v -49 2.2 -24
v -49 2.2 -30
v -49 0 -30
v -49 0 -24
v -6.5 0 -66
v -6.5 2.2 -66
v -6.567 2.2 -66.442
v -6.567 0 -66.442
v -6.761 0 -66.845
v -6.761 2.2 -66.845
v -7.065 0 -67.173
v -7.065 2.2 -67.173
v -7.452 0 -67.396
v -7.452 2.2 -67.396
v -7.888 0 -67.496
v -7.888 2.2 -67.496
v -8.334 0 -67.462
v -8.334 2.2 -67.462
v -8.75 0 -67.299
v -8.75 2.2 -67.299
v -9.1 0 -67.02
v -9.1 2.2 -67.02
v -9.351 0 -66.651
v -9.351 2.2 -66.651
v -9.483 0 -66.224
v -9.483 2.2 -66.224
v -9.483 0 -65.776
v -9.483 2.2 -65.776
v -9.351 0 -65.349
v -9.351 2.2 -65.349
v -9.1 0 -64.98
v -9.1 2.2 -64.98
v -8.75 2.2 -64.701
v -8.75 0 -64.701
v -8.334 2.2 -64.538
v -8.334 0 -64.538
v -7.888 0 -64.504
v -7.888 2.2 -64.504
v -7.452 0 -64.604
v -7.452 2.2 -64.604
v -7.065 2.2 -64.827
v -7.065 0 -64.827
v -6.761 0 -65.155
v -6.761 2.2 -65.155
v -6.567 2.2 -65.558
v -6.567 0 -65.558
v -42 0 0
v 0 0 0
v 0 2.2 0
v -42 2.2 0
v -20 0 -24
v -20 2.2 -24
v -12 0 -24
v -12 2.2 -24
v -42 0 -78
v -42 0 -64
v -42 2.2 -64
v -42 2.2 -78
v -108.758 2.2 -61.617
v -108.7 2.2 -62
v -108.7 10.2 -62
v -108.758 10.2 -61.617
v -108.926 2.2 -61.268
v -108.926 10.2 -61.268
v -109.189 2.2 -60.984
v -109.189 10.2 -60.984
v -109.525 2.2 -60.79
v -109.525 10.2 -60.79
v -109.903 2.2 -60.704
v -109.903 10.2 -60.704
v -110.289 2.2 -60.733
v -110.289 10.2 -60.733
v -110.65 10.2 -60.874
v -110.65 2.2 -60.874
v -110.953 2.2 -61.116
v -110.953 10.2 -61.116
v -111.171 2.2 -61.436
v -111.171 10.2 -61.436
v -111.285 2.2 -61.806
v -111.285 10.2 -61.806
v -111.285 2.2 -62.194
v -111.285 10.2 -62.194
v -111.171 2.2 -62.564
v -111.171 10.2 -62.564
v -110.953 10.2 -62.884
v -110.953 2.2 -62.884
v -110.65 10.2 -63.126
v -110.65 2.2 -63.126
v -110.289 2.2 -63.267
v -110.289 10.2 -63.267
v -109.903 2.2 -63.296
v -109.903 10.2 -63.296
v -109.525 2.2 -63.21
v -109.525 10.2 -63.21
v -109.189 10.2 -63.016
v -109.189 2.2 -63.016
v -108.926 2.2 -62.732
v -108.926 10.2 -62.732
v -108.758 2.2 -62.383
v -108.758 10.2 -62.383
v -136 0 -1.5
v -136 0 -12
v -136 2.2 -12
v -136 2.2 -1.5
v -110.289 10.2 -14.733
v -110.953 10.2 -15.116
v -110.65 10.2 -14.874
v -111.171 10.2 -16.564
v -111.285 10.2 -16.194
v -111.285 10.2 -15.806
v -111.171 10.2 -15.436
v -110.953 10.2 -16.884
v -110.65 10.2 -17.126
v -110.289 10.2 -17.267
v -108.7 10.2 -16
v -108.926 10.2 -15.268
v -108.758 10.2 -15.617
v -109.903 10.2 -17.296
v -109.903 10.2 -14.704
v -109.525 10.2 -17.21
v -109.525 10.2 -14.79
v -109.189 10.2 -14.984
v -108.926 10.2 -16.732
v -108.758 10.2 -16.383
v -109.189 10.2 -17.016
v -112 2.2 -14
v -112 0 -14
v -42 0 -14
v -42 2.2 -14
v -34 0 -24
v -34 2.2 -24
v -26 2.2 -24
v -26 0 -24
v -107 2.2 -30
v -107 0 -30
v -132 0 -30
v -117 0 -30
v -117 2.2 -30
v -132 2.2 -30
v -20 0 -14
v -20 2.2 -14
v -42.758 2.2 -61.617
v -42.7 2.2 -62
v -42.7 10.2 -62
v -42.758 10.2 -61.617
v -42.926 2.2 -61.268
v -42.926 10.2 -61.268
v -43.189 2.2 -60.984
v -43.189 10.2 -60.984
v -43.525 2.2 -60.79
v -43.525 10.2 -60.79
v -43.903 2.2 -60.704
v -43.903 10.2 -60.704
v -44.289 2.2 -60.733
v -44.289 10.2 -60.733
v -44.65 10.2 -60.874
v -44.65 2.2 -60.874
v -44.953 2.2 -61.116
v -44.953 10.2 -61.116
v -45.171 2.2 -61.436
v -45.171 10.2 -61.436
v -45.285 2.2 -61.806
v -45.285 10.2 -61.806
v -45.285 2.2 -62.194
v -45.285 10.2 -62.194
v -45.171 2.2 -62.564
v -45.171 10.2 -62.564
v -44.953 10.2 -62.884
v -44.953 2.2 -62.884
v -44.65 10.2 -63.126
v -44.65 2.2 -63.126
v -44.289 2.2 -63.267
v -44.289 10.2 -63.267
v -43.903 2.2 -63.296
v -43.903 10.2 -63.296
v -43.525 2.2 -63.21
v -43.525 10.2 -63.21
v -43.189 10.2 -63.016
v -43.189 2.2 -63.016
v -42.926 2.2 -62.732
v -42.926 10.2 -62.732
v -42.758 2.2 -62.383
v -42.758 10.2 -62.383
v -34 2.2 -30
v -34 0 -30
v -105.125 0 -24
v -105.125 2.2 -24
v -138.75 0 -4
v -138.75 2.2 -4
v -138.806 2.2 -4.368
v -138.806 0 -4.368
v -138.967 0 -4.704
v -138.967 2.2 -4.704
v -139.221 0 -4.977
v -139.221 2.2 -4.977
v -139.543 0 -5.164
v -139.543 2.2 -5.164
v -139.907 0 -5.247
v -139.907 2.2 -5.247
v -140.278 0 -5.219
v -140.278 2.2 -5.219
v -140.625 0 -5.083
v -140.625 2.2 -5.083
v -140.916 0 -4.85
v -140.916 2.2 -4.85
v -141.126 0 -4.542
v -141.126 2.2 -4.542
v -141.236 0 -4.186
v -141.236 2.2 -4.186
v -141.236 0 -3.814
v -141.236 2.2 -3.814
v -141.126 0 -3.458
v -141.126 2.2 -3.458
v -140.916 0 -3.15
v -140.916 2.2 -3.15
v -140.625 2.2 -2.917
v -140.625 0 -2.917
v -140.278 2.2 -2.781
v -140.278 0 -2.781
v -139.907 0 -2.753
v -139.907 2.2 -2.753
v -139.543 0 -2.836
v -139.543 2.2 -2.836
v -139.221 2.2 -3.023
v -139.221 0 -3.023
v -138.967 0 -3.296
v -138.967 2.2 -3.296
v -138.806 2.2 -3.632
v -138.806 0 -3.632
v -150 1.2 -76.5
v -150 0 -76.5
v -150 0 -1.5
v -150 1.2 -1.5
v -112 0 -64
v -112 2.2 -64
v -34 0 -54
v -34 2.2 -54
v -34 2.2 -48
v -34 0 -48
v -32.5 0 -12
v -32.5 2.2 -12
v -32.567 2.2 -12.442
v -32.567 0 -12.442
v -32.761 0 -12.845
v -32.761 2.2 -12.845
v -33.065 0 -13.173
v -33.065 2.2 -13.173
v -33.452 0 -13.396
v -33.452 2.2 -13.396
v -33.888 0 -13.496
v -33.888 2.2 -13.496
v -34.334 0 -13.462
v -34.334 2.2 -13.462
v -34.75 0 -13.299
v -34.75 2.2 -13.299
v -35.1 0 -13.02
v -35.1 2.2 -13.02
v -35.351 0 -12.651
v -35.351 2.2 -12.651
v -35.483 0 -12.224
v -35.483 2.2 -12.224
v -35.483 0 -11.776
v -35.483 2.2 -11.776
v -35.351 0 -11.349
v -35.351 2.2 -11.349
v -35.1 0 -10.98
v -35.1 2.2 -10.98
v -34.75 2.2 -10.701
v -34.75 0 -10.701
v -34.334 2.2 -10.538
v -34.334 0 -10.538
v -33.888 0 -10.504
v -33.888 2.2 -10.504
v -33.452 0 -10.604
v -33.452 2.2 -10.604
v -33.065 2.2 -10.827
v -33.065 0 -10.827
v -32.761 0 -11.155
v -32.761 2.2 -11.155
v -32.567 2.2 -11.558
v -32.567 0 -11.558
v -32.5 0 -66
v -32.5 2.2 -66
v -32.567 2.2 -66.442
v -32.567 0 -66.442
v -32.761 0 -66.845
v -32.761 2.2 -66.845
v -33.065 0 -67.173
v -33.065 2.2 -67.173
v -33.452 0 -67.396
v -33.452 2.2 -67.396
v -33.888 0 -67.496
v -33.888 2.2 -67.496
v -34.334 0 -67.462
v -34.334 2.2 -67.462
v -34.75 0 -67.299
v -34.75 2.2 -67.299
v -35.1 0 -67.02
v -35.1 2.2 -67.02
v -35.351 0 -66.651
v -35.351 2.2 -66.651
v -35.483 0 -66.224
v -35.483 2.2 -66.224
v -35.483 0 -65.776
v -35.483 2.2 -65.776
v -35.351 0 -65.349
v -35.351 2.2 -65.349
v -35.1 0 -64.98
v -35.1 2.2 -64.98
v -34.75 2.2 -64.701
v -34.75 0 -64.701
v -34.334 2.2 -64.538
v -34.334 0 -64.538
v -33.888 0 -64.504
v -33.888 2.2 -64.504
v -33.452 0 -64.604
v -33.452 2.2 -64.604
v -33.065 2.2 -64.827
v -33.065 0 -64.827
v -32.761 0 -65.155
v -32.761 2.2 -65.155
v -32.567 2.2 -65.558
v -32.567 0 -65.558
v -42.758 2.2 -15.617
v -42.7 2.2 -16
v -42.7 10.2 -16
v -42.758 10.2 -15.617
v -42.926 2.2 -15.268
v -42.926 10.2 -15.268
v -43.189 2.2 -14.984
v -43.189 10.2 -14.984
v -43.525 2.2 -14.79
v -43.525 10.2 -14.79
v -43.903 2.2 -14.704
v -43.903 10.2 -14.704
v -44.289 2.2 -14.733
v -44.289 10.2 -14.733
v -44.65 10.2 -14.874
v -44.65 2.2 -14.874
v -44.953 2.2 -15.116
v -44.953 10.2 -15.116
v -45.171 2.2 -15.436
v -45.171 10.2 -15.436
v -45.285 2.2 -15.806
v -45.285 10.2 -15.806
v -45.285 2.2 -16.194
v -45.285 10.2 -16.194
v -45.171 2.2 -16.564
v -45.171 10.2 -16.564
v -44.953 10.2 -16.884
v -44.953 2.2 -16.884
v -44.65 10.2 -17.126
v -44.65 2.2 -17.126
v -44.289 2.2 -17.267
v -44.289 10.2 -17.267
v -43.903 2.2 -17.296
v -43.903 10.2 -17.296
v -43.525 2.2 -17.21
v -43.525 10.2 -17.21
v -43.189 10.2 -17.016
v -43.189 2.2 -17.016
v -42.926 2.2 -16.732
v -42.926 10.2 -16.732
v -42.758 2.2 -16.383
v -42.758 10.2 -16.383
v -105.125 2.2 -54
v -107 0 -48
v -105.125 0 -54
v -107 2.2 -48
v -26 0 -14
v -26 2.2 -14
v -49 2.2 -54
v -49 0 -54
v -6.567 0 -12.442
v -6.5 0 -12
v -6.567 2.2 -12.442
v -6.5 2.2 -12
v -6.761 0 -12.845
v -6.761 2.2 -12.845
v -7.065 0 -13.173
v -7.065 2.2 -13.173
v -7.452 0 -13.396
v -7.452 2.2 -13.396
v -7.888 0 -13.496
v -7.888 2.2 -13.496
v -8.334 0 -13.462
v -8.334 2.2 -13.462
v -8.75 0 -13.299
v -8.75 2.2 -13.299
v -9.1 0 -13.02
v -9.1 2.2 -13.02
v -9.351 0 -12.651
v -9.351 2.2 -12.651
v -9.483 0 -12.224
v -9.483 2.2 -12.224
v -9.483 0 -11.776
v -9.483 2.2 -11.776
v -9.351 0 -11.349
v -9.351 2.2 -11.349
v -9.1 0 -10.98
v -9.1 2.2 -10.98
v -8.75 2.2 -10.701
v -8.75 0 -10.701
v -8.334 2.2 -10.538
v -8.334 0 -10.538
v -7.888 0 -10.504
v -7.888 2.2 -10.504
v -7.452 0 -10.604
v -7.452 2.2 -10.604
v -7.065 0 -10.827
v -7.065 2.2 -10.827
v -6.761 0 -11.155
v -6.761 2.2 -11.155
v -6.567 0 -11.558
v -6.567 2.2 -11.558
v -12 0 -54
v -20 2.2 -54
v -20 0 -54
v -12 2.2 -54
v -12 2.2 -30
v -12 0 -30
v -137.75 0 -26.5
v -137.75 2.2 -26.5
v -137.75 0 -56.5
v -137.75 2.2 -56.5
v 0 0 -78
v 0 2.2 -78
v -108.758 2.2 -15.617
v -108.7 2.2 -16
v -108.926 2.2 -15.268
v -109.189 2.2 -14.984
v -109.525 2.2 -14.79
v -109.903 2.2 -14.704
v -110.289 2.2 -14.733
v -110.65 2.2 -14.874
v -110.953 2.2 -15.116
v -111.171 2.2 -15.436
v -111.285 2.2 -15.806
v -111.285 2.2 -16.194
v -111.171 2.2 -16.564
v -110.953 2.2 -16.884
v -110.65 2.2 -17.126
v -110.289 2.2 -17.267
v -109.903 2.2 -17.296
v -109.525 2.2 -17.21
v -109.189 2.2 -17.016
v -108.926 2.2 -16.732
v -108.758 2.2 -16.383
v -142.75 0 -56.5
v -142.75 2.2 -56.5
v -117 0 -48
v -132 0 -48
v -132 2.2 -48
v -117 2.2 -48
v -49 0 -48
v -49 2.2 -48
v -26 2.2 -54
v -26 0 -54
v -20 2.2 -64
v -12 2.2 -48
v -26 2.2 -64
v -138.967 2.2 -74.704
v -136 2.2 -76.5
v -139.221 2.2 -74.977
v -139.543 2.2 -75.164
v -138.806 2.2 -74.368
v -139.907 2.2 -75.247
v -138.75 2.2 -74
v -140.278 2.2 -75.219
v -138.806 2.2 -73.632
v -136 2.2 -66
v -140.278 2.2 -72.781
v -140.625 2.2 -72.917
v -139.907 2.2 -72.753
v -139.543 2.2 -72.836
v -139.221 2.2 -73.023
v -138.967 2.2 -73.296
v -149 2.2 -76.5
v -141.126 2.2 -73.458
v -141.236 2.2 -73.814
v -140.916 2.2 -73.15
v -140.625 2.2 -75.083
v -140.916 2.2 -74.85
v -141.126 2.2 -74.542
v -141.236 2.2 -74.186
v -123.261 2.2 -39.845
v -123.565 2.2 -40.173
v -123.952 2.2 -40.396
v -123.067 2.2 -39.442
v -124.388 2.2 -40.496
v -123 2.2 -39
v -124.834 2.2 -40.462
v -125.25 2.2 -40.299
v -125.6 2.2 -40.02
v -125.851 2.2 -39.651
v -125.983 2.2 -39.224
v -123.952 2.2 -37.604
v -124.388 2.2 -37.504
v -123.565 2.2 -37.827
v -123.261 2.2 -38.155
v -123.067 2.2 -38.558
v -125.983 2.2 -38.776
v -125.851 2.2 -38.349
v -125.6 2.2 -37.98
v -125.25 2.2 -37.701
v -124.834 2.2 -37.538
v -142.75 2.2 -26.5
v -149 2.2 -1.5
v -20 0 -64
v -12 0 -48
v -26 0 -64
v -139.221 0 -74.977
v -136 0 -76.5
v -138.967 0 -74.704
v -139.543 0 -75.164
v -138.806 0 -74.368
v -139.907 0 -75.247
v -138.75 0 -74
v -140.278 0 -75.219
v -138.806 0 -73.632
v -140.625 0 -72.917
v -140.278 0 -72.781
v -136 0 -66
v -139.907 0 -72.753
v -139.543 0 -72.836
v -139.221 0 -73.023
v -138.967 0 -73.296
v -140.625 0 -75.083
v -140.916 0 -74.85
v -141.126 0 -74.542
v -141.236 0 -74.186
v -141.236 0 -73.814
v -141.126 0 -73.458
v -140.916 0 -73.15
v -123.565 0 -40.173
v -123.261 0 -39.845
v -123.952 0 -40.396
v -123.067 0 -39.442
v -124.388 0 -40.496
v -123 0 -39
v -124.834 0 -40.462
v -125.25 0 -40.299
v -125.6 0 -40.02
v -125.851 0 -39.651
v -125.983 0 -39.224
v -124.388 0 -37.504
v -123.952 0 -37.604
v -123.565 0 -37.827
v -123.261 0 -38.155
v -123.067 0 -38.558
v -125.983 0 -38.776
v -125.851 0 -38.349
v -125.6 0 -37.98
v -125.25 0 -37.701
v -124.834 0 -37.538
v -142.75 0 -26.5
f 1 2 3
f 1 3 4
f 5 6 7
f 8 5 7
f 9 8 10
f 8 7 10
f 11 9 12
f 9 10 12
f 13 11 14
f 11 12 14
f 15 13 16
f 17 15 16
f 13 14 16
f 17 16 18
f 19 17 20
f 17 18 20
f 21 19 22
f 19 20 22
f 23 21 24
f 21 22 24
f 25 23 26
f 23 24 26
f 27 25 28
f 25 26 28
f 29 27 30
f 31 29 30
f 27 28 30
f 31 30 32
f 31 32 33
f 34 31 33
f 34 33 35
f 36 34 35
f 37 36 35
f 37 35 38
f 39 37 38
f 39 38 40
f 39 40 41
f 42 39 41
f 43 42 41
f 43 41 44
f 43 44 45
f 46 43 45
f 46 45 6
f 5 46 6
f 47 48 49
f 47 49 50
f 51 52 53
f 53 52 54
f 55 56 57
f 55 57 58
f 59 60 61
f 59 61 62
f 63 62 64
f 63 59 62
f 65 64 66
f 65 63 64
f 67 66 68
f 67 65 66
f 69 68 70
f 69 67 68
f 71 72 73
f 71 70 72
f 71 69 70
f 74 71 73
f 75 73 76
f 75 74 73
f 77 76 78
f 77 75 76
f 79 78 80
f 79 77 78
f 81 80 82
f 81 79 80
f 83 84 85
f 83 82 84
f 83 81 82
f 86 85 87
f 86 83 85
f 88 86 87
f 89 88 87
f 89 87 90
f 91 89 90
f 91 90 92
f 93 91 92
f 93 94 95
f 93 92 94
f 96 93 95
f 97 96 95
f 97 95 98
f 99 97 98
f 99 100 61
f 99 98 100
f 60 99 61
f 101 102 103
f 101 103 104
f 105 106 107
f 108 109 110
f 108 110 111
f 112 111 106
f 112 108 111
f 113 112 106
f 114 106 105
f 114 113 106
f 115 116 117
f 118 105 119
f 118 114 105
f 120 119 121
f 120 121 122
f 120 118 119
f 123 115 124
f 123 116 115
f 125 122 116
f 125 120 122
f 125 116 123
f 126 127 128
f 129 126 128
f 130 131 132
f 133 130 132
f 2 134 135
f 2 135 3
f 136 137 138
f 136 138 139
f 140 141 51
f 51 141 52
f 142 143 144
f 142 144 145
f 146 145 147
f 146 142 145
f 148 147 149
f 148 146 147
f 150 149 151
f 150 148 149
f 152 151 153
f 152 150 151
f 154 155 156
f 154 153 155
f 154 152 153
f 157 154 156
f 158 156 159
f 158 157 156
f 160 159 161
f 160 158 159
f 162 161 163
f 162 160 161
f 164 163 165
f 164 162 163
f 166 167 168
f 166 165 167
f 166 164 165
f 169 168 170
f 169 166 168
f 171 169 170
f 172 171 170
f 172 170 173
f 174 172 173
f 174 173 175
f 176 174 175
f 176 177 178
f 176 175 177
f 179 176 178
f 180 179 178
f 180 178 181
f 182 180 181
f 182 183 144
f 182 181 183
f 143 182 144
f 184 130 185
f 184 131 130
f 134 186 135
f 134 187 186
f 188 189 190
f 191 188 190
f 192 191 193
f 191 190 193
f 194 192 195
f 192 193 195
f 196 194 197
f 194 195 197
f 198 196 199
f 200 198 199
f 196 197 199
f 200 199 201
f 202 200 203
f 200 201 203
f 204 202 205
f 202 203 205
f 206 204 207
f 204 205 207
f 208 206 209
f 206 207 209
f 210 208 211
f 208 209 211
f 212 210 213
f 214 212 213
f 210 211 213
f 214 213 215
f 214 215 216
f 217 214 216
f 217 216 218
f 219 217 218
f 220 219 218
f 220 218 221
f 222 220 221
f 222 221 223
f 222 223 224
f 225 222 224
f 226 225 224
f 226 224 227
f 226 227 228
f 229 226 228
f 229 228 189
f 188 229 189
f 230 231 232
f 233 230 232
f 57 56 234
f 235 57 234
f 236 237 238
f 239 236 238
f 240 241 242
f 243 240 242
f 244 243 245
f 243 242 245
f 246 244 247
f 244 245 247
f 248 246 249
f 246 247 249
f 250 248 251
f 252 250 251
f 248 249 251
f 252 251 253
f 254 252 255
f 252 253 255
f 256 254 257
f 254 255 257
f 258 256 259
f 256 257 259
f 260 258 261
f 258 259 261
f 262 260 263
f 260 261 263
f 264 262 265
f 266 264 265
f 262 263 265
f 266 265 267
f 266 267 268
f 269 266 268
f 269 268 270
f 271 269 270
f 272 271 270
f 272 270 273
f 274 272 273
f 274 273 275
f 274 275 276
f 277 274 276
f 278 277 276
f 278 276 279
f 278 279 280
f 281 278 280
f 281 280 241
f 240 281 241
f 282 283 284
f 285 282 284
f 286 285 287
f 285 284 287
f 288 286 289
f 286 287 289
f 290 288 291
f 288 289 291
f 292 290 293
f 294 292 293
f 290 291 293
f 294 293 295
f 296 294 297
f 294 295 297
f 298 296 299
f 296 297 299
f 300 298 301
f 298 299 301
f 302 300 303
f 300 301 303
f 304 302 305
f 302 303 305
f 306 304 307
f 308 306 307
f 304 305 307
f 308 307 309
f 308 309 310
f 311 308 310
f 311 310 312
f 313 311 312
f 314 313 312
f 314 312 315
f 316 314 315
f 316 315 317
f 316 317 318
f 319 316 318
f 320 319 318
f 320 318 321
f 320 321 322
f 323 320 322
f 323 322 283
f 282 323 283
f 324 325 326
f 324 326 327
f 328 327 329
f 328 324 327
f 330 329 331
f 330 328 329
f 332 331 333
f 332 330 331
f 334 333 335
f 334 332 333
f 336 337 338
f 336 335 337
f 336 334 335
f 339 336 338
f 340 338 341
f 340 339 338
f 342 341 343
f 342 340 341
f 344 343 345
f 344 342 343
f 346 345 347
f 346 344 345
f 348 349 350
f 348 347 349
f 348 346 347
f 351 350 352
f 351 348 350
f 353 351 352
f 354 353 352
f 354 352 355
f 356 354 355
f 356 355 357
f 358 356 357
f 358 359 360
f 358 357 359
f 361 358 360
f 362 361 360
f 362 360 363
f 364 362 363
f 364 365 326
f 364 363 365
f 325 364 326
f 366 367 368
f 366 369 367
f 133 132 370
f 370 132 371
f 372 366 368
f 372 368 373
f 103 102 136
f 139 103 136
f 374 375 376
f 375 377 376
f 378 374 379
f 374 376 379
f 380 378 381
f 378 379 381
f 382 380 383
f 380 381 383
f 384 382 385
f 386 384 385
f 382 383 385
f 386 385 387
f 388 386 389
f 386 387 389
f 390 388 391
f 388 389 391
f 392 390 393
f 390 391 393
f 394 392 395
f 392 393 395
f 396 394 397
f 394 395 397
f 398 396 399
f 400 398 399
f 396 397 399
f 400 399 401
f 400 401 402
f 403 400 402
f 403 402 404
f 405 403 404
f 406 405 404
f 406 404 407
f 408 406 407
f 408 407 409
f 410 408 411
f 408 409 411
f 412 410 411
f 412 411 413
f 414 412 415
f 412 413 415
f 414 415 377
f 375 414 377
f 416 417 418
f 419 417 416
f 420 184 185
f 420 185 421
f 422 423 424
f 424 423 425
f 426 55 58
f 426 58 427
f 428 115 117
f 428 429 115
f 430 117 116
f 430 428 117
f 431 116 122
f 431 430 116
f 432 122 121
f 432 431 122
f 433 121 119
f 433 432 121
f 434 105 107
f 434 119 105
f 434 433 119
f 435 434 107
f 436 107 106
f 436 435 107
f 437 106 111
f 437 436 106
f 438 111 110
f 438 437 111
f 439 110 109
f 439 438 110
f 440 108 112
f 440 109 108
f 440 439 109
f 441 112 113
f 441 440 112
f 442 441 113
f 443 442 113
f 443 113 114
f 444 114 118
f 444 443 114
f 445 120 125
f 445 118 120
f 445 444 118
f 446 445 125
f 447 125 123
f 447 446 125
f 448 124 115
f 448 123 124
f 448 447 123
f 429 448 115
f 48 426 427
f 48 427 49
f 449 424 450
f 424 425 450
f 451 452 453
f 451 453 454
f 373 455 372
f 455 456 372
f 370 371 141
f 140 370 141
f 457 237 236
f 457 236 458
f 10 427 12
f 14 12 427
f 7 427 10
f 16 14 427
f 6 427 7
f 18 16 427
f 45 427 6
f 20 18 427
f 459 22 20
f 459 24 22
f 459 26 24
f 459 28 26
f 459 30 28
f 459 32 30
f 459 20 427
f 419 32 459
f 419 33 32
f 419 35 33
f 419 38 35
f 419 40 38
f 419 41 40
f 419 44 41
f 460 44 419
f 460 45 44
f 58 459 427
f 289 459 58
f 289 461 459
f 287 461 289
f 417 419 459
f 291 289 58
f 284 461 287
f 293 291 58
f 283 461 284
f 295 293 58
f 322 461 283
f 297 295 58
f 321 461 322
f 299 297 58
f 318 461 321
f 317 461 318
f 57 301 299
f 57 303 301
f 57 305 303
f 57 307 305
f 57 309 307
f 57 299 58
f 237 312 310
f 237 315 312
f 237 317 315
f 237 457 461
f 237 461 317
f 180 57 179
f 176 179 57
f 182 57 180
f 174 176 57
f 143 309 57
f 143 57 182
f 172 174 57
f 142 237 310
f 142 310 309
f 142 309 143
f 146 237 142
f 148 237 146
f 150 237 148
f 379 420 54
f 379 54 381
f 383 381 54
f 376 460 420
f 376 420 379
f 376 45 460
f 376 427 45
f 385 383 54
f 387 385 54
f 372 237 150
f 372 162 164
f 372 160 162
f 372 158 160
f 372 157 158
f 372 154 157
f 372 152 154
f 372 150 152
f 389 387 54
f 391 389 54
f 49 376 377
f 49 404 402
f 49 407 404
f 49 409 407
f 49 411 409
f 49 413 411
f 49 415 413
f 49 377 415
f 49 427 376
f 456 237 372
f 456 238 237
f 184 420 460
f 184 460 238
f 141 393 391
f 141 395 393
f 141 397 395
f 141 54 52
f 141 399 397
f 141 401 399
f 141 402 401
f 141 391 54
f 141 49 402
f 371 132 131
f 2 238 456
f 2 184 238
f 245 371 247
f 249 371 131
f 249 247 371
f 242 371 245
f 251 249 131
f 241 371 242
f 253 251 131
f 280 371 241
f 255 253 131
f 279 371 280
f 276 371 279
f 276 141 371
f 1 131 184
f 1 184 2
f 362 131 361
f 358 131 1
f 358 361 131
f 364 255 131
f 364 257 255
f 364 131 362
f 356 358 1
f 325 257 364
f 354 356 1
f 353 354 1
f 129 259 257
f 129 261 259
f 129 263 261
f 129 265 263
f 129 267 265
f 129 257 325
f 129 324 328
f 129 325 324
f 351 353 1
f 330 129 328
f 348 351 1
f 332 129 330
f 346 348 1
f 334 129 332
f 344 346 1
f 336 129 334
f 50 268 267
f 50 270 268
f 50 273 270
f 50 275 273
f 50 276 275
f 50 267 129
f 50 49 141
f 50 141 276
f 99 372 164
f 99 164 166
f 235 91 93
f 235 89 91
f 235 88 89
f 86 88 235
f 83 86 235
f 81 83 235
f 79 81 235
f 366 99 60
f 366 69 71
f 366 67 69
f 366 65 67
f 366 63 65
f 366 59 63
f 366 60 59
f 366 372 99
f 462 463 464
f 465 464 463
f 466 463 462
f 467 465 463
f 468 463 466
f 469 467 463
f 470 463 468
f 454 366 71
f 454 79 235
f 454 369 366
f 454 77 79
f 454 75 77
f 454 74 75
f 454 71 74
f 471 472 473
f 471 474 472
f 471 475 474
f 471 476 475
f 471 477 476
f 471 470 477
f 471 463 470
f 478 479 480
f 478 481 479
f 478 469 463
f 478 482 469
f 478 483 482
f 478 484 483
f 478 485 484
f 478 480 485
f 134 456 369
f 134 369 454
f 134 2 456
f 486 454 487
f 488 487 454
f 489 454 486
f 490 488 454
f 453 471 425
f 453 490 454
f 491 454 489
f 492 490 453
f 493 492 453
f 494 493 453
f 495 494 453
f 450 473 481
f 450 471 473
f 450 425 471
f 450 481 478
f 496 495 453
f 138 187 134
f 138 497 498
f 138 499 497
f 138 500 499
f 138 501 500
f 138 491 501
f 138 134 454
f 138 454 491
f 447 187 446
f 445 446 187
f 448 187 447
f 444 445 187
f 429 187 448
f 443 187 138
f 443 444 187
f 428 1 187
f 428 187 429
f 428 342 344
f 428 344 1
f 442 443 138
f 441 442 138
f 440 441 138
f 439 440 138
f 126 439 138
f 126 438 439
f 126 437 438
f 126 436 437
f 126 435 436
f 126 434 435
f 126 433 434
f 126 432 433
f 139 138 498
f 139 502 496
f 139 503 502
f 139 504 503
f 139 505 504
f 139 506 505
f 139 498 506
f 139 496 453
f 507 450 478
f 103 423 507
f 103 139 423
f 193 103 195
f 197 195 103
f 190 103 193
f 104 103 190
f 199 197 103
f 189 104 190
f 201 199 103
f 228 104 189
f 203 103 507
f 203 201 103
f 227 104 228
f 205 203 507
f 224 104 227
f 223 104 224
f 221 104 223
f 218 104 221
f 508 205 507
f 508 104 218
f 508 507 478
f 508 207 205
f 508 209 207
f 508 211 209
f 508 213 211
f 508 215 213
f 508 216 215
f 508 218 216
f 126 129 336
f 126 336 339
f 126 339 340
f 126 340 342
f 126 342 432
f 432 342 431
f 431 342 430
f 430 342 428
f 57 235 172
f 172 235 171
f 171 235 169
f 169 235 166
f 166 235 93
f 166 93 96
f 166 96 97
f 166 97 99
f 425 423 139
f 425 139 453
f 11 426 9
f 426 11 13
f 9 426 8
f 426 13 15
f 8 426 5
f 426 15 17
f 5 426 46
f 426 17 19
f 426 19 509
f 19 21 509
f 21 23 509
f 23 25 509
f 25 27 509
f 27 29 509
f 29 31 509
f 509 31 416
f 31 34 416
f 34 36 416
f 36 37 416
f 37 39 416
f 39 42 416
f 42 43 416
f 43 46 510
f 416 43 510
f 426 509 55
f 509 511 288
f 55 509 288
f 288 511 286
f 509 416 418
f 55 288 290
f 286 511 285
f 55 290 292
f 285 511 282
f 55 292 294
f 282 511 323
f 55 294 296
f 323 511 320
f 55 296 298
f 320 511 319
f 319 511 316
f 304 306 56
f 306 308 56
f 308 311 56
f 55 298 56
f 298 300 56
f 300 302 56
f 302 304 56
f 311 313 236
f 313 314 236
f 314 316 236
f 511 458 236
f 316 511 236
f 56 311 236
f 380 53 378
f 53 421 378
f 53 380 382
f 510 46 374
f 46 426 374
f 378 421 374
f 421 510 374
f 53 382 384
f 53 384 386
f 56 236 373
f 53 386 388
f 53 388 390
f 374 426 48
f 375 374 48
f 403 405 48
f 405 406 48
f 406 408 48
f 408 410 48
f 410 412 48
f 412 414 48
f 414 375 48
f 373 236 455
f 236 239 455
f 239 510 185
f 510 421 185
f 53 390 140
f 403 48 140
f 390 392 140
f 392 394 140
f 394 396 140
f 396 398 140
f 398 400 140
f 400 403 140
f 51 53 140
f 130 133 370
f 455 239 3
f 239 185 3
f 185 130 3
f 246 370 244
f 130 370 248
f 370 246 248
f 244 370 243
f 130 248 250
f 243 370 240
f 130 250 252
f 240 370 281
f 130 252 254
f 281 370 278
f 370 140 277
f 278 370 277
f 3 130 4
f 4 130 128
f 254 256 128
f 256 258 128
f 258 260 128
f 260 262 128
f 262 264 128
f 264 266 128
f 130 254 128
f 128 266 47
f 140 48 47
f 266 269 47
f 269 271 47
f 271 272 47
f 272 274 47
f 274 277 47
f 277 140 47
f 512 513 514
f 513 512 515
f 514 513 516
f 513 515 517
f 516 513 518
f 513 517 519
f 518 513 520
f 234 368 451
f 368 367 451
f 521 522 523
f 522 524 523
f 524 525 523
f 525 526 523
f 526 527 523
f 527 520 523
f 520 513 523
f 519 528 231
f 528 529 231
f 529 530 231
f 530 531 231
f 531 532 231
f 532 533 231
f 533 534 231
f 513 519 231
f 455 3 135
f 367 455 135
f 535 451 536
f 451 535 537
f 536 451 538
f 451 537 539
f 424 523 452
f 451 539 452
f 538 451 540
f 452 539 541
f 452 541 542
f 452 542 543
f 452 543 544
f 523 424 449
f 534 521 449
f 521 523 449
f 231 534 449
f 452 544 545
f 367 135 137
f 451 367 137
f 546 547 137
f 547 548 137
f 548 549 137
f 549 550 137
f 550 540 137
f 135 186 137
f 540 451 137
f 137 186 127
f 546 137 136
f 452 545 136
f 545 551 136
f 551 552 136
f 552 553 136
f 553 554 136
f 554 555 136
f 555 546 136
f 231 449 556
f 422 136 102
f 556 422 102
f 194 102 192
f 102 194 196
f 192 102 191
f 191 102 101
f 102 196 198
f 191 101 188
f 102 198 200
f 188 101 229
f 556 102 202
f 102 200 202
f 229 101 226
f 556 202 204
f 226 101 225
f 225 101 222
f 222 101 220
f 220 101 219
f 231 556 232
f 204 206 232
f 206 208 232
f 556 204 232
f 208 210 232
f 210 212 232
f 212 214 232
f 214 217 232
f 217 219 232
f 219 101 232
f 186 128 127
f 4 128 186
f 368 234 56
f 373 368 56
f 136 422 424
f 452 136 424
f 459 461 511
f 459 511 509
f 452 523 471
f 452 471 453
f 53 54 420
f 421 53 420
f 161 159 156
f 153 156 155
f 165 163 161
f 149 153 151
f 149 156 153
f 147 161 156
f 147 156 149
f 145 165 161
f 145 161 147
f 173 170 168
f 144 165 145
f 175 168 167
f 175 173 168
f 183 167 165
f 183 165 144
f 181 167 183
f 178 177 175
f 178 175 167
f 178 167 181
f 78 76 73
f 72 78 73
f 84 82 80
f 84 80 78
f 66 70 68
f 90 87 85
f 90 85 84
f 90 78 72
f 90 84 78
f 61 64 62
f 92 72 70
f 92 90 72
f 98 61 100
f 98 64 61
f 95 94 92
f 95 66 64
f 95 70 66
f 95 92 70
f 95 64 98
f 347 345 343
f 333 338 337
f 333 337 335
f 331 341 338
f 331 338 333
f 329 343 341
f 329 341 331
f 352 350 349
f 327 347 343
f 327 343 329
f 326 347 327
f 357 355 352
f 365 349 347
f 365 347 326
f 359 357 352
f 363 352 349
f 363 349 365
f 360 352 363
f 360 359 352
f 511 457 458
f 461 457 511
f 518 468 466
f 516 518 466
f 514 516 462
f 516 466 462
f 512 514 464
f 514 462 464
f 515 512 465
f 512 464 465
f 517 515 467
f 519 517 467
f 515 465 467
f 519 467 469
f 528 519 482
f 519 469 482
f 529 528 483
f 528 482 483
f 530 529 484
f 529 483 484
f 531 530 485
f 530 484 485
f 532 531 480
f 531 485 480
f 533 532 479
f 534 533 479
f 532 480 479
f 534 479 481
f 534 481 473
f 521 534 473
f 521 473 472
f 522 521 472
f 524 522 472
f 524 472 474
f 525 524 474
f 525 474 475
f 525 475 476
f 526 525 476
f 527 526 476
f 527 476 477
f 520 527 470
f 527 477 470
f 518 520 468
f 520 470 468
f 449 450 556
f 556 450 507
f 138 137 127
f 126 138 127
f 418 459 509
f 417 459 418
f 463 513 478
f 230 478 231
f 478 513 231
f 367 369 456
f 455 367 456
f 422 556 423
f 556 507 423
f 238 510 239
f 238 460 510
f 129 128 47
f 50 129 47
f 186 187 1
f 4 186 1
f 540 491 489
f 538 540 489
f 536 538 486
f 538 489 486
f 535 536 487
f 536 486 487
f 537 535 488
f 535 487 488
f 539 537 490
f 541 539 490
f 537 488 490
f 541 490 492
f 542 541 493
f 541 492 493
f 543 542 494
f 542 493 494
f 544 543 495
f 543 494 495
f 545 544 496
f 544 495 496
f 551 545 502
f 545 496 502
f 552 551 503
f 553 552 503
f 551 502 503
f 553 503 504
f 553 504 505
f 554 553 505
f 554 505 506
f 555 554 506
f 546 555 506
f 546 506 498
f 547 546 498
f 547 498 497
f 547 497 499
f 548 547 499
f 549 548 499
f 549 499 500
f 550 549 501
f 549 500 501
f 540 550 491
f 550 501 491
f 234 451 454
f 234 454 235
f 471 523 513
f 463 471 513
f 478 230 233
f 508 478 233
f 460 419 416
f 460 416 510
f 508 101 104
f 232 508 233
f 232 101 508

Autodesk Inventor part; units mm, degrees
ref_plane "YZ Plane" through (0, 0, 0) normal (1, 0, 0) x (0, 1, 0)
ref_plane "XZ Plane" through (0, 0, 0) normal (0, 1, 0) x (-1, 0, 0)
ref_plane "XY Plane" through (0, 0, 0) normal (0, 0, 1) x (1, 0, 0)
sketch "Sketch1" plane through (0, 0, 0) normal (0, 1, 0) x (-1, 0, 0)
  line L0 (42, -64) -> (112, -64)
  line L1 (112, -64) -> (112, -14)
  line L2 (112, -14) -> (42, -14)
  line L3 (112, -39) -> (112, -30)
  line L4 (112, -39) -> (112, -48)
  line L5 (112, -30) -> (136, -30)
  line L6 (136, -30) -> (136, -48)
  line L7 (136, -48) -> (112, -48)
  line L8 (112, -30) -> (117, -30)
  line L9 (117, -30) -> (112, -14)
  line L10 (112, -48) -> (117, -48)
  line L11 (117, -48) -> (112, -64)
  line L12 (136, -30) -> (136, -1.5)
  line L13 (136, -1.5) -> (150, -1.5)
  line L14 (136, -48) -> (136, -76.5)
  line L15 (136, -76.5) -> (150, -76.5)
  line L16 (150, -76.5) -> (150, -1.5)
  line L17 (42, -14) -> (42, 0)
  line L18 (42, 0) -> (42, -78)
  line L19 (42, -78) -> (0, -78)
  line L20 (0, -78) -> (0, 0)
  line L21 (0, 0) -> (42, 0)
  line L22 (136, -30) -> (132, -30)
  line L23 (136, -30) -> (136, -12)
  line L24 (136, -12) -> (132, -30)
  line L25 (136, -48) -> (132, -48)
  line L26 (136, -48) -> (136, -66)
  line L27 (136, -66) -> (132, -48)
  dimension "d3" = 70
  dimension "d4" = 50
  dimension "d5" = 9
  dimension "d6" = 9
  dimension "d7" = 24
  dimension "d8" = 18
  dimension "d9" = 5
  dimension "d10" = 5
  dimension "d11" = 28.5
  dimension "d12" = 14
  dimension "d13" = 28.5
  dimension "d14" = 14
  dimension "d20" = 78
  dimension "d21" = 42
  dimension "d22" = 14
  dimension "d23" = 14
  dimension "d24" = 1.5
  dimension "d25" = 94
  dimension "d26" = 4
  dimension "d27" = 18
  dimension "d28" = 4
  dimension "d29" = 18
extrude "Extrusion1" add sketch "Sketch1" along normal blind 2.2
sketch "Sketch2" plane through (0, 2.2, 0) normal (0, 1, 0) x (1, 0, 0)
  circle A0 centre (-34, 12) radius 1.5
  circle A1 centre (-8, 12) radius 1.5
  line L0 (-42, 0) -> (0, 0) projected
  line L1 (0, 0) -> (0, 78) projected
  line L2 (-42, 14) -> (-42, 0) projected
  circle A2 centre (-34, 66) radius 1.5
  circle A3 centre (-8, 66) radius 1.5
  line L3 (-42, 78) -> (-42, 64) projected
  line L4 (0, 78) -> (-42, 78) projected
  circle A4 centre (-124.5, 39) radius 1.5
  line L5 (-132, 30) -> (-117, 30) projected
  circle A5 centre (-140, 4) radius 1.25
  line L6 (-136, 1.5) -> (-136, 12) projected
  line L7 (-150, 1.5) -> (-136, 1.5) projected
  circle A6 centre (-140, 74) radius 1.25
  line L8 (-136, 66) -> (-136, 76.5) projected
  line L9 (-136, 76.5) -> (-150, 76.5) projected
  line L10 (-142.75, 26.5) -> (-137.75, 26.5)
  line L11 (-137.75, 26.5) -> (-137.75, 56.5)
  line L12 (-137.75, 56.5) -> (-142.75, 56.5)
  line L13 (-142.75, 56.5) -> (-142.75, 26.5)
  line L14 (-150, 76.5) -> (-150, 1.5) projected
  dimension "d32" = 3
  dimension "d33" = 3
  dimension "d34" = 12
  dimension "d35" = 8
  dimension "d36" = 8
  dimension "d37" = 12
  dimension "d38" = 3
  dimension "d39" = 3
  dimension "d40" = 8
  dimension "d41" = 12
  dimension "d42" = 12
  dimension "d43" = 8
  dimension "d44" = 9
  dimension "d45" = 7.5
  dimension "d46" = 3
  dimension "d47" = 2.5
  dimension "d48" = 4
  dimension "d49" = 2.5
  dimension "d50" = 2.5
  dimension "d51" = 4
  dimension "d52" = 2.5
  dimension "d53" = 5
  dimension "d54" = 30
  dimension "d55" = 20
  dimension "d56" = 7.25
extrude "Extrusion2" cut sketch "Sketch2" against normal blind 2.2
sketch "Sketch3" plane through (0, 2.2, 0) normal (0, 1, 0) x (1, 0, 0)
  line L0 (-42, 14) -> (-42, 0) projected
  line L1 (-42, 64) -> (-112, 64) projected
  line L2 (-42, 14) -> (-112, 14)
  line L3 (-112, 14) -> (-112, 64)
  line L4 (-112, 64) -> (-42, 64)
  line L5 (-42, 64) -> (-42, 14)
  circle A0 centre (-110, 16) radius 1.3
  circle A1 centre (-110, 62) radius 1.3
  circle A2 centre (-44, 16) radius 1.3
  circle A3 centre (-44, 62) radius 1.3
  point P0 (0, 0)
  dimension "d59" = 2
  dimension "d60" = 2
  dimension "d61" = 2.6
  dimension "d62" = 2
  dimension "d63" = 2
  dimension "d64" = 2.6
  dimension "d65" = 2.6
  dimension "d66" = 2.6
  dimension "d67" = 2
  dimension "d68" = 2
  dimension "d69" = 2
  dimension "d70" = 2
extrude "Extrusion3" add sketch "Sketch3" along normal blind 8 contours A0 | A1 | A2 | A3
sketch "Sketch4" plane through (0, 2.2, 0) normal (0, 1, 0) x (1, 0, 0)
  line L0 (-132, 30) -> (-117, 30) projected
  line L1 (-117, 30) -> (-112, 14) projected
  line L2 (-105.125, 24) -> (-107, 30)
  line L3 (-117, 48) -> (-132, 48) projected
  line L4 (-112, 64) -> (-117, 48) projected
  line L5 (-112, 64) -> (-102, 64)
  line L6 (-42, 64) -> (-112, 64) projected
  line L7 (-107, 48) -> (-105.125, 54)
  line L8 (-112, 14) -> (-42, 14) projected
  line L9 (-107, 30) -> (-49, 30)
  line L10 (-49, 30) -> (-49, 24)
  line L11 (-105.125, 24) -> (-49, 24)
  line L12 (-107, 48) -> (-49, 48)
  line L13 (-49, 48) -> (-49, 54)
  line L14 (-105.125, 54) -> (-49, 54)
  point P0 (0, 0)
  dimension "d79" = 10
  dimension "d88" = 10
  dimension "d93" = 10
  dimension "d111" = 58
  dimension "d112" = 6
  dimension "d113" = 10
  dimension "d114" = 6
  dimension "d115" = 72.646
  dimension "d116" = 58
  dimension "d117" = 56.125
  dimension "d118" = 18
  dimension "d119" = 6
  dimension "d120" = 6
extrude "Extrusion4" cut sketch "Sketch4" against normal blind 8
sketch "Sketch6" plane through (0, 2.2, 0) normal (0, 1, 0) x (1, 0, 0)
  line L0 (-34, 24) -> (-26, 24)
  line L1 (-26, 24) -> (-26, 14)
  line L2 (-26, 14) -> (-20, 14)
  line L3 (-34, 24) -> (-34, 30)
  line L4 (-34, 30) -> (-20, 30)
  line L5 (-20, 14) -> (-20, 24)
  line L6 (-20, 24) -> (-12, 24)
  line L7 (-12, 24) -> (-12, 30)
  line L8 (-12, 30) -> (-20, 30)
  line L9 (0, 0) -> (0, 78) projected
  line L10 (0, 39) -> (-41.084, 39)
  line L11 (-34, 54) -> (-26, 54)
  line L12 (-26, 54) -> (-26, 64)
  line L13 (-26, 64) -> (-20, 64)
  line L14 (-34, 54) -> (-34, 48)
  line L15 (-34, 48) -> (-20, 48)
  line L16 (-20, 64) -> (-20, 54)
  line L17 (-20, 54) -> (-12, 54)
  line L18 (-12, 54) -> (-12, 48)
  line L19 (-12, 48) -> (-20, 48)
  line L20 (-49, 30) -> (-49, 24) projected
  dimension "d97" = 8
  dimension "d98" = 10
  dimension "d99" = 6
  dimension "d100" = 16
  dimension "d101" = 6
  dimension "d102" = 10
  dimension "d103" = 8
  dimension "d104" = 6
  dimension "d105" = 9
  dimension "d121" = 15
extrude "Extrusion5" cut sketch "Sketch6" against normal blind 8
chamfer "Chamfer1" distance 1 angle 45 1 edges at (-150, 2.2, -39)
properties part number "onderplaat final"
